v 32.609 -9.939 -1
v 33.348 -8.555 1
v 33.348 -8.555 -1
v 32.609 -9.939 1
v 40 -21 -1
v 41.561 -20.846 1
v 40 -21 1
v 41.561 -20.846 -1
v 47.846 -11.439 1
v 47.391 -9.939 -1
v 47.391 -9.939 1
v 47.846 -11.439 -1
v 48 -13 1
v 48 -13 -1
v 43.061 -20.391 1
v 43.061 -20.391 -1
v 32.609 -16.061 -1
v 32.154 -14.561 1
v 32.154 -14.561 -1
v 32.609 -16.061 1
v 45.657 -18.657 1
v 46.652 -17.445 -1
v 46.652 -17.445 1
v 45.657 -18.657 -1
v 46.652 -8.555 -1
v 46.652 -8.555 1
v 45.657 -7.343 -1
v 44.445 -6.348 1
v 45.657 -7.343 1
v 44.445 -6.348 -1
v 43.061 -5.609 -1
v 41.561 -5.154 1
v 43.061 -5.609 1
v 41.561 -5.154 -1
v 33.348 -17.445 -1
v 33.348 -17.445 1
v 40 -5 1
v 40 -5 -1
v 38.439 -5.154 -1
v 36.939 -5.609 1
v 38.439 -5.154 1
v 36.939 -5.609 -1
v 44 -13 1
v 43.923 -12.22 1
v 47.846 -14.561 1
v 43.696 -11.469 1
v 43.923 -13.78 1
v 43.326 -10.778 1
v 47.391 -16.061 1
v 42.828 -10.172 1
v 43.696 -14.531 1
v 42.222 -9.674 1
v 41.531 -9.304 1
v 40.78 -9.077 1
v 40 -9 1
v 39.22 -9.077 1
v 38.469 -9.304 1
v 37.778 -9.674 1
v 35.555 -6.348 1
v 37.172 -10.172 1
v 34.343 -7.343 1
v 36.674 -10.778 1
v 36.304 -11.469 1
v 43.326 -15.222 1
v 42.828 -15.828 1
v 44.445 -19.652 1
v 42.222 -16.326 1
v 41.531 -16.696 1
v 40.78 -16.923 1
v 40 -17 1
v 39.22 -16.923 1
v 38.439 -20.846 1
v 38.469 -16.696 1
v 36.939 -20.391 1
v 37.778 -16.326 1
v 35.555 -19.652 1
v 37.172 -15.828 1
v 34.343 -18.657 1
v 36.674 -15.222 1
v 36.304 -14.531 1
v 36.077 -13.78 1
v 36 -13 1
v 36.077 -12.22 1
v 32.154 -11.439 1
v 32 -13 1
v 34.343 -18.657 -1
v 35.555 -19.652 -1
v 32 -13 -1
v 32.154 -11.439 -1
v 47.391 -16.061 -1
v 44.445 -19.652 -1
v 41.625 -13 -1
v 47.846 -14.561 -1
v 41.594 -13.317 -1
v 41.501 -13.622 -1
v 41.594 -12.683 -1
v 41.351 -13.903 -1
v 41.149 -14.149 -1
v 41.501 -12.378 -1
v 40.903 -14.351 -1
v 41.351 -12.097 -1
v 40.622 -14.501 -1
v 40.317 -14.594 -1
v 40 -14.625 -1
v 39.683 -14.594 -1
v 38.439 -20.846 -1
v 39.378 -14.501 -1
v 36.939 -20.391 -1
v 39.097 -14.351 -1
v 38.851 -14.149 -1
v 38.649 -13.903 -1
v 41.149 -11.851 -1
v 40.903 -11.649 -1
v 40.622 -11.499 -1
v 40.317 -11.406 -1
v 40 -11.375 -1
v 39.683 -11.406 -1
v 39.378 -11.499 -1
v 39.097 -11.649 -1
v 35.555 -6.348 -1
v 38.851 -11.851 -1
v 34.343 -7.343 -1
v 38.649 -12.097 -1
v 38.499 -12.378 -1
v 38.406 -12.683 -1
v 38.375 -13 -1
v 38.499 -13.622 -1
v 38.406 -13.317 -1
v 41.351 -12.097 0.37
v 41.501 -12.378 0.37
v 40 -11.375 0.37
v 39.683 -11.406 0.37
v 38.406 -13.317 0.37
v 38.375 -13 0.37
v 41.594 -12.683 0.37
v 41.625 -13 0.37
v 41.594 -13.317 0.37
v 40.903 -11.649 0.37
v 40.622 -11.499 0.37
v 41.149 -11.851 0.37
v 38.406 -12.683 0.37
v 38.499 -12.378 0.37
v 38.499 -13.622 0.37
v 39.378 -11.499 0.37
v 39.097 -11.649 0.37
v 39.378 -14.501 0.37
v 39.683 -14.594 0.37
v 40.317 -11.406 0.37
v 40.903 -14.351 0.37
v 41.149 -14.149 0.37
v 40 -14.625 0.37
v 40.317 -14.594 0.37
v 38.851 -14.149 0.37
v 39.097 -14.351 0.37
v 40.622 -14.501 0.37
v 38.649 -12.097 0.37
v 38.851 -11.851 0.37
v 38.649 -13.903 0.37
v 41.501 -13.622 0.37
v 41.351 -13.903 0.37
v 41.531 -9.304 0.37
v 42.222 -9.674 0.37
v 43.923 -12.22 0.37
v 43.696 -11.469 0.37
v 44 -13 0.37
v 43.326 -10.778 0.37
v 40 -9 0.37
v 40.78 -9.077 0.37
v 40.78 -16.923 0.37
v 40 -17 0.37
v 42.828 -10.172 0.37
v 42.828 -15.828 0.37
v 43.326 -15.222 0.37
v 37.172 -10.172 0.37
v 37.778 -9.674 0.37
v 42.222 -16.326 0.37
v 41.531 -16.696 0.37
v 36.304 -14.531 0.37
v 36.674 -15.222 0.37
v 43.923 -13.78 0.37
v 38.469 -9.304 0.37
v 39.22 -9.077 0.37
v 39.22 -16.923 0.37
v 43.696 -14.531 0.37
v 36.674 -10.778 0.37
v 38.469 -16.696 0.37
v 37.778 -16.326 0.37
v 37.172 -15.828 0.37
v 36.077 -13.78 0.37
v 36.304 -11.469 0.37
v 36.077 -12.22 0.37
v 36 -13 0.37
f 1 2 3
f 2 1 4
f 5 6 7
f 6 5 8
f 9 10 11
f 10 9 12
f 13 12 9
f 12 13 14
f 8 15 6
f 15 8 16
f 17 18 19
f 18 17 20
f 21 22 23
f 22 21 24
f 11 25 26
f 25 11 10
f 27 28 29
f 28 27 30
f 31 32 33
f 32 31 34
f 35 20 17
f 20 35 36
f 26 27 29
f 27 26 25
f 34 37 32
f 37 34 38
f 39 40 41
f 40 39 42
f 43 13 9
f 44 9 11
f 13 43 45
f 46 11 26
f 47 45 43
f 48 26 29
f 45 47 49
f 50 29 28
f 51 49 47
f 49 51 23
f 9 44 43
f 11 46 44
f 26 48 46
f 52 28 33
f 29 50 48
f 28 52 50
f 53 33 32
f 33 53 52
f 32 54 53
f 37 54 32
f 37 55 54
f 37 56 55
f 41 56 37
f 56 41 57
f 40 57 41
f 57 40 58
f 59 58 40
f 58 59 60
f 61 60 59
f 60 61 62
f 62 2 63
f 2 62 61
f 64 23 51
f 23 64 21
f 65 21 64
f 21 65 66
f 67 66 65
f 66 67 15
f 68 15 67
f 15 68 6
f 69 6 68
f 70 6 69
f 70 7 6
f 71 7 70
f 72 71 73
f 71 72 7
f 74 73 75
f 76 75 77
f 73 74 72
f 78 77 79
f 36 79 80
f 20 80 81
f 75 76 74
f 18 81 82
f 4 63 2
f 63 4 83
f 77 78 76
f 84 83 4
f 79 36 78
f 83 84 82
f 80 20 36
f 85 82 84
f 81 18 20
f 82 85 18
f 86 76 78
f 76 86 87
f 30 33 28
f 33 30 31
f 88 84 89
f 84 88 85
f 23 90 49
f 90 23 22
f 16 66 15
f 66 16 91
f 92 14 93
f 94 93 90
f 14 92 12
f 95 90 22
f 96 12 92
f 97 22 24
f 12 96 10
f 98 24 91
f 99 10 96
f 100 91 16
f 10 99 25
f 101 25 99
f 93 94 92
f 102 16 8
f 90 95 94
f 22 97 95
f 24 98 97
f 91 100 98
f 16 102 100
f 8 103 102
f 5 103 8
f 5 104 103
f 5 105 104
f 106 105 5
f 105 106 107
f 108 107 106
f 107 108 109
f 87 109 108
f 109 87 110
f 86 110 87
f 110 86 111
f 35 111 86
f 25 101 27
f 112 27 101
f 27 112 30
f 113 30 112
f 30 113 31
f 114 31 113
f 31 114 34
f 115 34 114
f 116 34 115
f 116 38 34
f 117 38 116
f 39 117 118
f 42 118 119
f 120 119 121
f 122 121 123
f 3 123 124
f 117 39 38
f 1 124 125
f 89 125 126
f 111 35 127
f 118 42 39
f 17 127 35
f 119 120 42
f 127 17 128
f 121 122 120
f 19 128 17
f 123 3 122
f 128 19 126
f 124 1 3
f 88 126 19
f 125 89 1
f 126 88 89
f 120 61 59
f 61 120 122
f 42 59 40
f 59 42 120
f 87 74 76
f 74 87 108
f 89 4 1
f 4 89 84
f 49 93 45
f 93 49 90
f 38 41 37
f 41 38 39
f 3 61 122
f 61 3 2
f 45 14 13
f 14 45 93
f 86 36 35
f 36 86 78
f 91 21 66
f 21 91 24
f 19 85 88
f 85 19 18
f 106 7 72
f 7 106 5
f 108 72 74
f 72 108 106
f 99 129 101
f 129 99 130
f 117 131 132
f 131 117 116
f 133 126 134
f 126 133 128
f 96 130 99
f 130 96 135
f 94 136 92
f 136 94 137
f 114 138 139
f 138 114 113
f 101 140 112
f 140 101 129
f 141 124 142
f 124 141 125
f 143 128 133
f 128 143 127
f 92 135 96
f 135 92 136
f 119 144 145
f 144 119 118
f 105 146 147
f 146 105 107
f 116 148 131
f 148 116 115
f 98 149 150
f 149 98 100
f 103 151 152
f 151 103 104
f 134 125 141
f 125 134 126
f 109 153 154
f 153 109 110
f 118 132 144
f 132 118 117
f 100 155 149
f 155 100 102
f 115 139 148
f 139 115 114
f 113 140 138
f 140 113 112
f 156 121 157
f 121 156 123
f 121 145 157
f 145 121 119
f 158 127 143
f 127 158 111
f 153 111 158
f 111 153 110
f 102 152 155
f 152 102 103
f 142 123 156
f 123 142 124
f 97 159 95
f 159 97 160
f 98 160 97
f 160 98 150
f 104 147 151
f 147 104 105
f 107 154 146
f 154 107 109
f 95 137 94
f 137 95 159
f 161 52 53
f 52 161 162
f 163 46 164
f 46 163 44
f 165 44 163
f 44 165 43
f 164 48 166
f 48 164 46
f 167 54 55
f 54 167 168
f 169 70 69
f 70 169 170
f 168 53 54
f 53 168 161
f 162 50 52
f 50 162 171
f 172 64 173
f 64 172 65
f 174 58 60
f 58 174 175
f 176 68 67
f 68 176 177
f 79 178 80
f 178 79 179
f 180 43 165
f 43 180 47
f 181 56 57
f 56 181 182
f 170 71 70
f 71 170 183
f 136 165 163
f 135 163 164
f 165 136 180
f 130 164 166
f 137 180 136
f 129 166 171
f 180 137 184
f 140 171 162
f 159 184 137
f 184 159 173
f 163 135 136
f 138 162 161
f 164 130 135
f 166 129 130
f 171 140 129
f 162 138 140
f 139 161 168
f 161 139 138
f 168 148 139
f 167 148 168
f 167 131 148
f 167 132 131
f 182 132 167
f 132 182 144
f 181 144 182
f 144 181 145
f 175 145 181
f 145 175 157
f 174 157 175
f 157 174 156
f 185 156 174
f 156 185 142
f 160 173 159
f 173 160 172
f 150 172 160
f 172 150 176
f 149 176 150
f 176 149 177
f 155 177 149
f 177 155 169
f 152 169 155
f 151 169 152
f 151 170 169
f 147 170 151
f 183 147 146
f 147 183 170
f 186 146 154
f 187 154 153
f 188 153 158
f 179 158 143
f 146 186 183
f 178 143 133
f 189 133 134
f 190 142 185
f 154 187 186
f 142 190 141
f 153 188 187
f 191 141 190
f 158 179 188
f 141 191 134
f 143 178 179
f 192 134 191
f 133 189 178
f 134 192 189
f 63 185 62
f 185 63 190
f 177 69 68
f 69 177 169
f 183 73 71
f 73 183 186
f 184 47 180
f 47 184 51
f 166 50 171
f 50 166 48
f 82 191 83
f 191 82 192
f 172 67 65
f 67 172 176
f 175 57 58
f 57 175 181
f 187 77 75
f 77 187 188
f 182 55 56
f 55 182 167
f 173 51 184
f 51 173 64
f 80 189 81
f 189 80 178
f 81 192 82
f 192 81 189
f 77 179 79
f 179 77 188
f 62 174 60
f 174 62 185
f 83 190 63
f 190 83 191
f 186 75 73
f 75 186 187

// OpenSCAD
//!OpenSCAD

DRAFT = 1; // switch off for potentially higher quality final render
smooth = DRAFT == 1 ? 32 : 128;
pad = 0.01;
$fn = smooth;

// Cookie cutter dimensions
base_h = 3;
feature_h = 3;
cut_base_h = 3;
cut_h = 20;
cut_w = 80;
cut_l = 70;

// Nail dimensions
nail_head_h = 0.75;
nail_head_d = 8;
nail_head_r = nail_head_d / 2;
nail_shaft_d = 3.25;
nail_shaft_r = nail_shaft_d / 2;

// Cutter (heart outline with "tall" outline)
union()
{
    translate([0,0,cut_base_h-pad])
    linear_extrude(height=cut_h)
    scale(0.1)import(file="BaymaxHeartFace.dxf", layer="Outline", center=true);
    linear_extrude(height=cut_base_h)
    scale(0.1)import(file="BaymaxHeartFace.dxf", layer="Base", center=true);
}

// Features (heart shape with Eve's face)
translate([0,cut_l,0])
union()
{
    linear_extrude(height=base_h)
    scale(0.1)import(file="BaymaxHeartFace.dxf", layer="Heart", center=true);

    translate([0,0,base_h-pad])
    linear_extrude(height=feature_h)
    scale(0.1)
    difference(){
        import(file="BaymaxHeartFace.dxf", layer="Face", center=true);
        import(file="BaymaxHeartFace.dxf", layer="Eyes", center=true);
    }
}

// Circular "patch" to cover/secure nail head to cookie cutter feature plate
translate([cut_w / 2, - nail_head_r * 2 - 5, 0])
difference()
{
    cylinder(h=2, r=nail_head_r * 2, center=true);
    #cylinder(h=2+pad, r=nail_shaft_r, center=true);
    translate([0,0,nail_head_h])cylinder(h=nail_head_h+pad, r=nail_head_r, center=true);
}
